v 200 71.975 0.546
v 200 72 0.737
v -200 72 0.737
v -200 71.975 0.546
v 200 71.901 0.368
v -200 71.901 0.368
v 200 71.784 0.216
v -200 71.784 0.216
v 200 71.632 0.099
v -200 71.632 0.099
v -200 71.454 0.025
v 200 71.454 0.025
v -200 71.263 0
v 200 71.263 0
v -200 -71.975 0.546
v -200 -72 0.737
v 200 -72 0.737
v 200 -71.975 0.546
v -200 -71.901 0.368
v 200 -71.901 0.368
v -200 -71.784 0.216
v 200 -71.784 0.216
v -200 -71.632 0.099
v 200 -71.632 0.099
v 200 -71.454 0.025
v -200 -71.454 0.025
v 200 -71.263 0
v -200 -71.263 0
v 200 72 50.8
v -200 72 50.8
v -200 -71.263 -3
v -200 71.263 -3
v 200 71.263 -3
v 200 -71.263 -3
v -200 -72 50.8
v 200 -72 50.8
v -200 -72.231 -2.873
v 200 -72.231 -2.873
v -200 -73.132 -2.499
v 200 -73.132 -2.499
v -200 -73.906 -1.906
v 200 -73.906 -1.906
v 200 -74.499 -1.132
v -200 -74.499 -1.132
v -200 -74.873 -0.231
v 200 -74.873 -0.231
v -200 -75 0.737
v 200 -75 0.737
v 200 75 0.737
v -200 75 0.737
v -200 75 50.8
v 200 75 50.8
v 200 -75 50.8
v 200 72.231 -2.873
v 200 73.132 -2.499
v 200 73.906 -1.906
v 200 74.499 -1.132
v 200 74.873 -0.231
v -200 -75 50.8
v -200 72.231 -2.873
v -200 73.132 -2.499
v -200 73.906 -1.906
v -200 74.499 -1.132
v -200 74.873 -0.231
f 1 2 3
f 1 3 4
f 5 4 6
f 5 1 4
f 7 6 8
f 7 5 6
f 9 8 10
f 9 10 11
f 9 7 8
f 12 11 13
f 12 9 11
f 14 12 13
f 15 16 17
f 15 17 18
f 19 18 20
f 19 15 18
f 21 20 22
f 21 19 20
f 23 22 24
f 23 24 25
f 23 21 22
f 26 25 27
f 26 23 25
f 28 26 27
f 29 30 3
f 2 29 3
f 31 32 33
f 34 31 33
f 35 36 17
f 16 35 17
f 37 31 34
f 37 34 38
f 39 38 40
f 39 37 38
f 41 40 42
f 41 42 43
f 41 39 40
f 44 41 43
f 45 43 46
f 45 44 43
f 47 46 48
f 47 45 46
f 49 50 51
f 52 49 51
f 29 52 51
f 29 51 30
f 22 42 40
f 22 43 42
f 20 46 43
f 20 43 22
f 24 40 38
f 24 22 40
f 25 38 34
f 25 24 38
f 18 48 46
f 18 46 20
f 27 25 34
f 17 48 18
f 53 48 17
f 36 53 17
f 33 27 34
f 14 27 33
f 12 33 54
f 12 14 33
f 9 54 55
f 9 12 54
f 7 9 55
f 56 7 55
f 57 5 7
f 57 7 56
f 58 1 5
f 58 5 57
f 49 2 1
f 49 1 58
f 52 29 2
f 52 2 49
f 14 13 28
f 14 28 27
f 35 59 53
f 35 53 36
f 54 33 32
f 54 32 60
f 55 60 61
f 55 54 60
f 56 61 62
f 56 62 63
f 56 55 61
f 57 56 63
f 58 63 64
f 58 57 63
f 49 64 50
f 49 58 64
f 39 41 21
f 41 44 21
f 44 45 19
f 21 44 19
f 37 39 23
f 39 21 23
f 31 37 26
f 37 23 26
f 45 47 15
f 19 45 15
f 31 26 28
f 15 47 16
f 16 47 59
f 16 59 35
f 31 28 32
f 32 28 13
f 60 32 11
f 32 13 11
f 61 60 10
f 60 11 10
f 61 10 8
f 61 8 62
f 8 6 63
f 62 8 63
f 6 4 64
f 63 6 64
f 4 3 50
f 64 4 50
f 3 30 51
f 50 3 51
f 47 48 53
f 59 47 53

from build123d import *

# Parameters (mm, degrees)
SKETCH1_W                    = 400
SKETCH1_H                    = 150
BASE_FLANGE1_DEPTH           = 3
EDGE_FLANGE1_STRIP_W         = 13.4732
EDGE_FLANGE1_STRIP_H         = 3
EDGE_FLANGE1_STRIP_CUT_DEPTH = 400
EDGE_FLANGE1_DEPTH           = 400
EDGE_FLANGE2_STRIP_W         = 13.4732
EDGE_FLANGE2_STRIP_H         = 3
EDGE_FLANGE2_STRIP_CUT_DEPTH = 400
EDGE_FLANGE2_DEPTH           = 400


# Sheet-metal steps are written as plain solids
with BuildPart() as part:
    # Sketch1 → Base-Flange1 (new body)
    with BuildSketch(Plane.XY):
        Rectangle(SKETCH1_W, SKETCH1_H)
    extrude(amount=-BASE_FLANGE1_DEPTH)

    # Edge-Flange1 strip (across the edge) → Edge-Flange1 strip cut (cut)
    with BuildSketch(Plane(origin=(-200, -75, 0), x_dir=(0, 1, 0), z_dir=(1, 0, 0))):
        with Locations((-3, -1.5)):
            Rectangle(EDGE_FLANGE1_STRIP_W, EDGE_FLANGE1_STRIP_H)
    extrude(amount=EDGE_FLANGE1_STRIP_CUT_DEPTH, mode=Mode.SUBTRACT)

    # Edge-Flange1 section (across the edge) → Edge-Flange1 (add)
    with BuildSketch(Plane(origin=(-200, -75, 0), x_dir=(0, 1, 0), z_dir=(1, 0, 0))):
        with BuildLine():
            Line((0, 0.7366), (0, 50.8))
            Line((0, 50.8), (3, 50.8))
            Line((3, 50.8), (3, 0.7366))
            ThreePointArc((3, 0.7366), (3.215745145, 0.215745145), (3.7366, 0))
            Line((3.7366, 0), (3.7366, -3))
            ThreePointArc((3.7366, -3), (1.094424801, -1.905575199), (0, 0.7366))
        make_face()
    extrude(amount=EDGE_FLANGE1_DEPTH)

    # Edge-Flange2 strip (across the edge) → Edge-Flange2 strip cut (cut)
    with BuildSketch(Plane(origin=(200, 75, 0), x_dir=(0, -1, 0), z_dir=(-1, 0, 0))):
        with Locations((-3, -1.5)):
            Rectangle(EDGE_FLANGE2_STRIP_W, EDGE_FLANGE2_STRIP_H)
    extrude(amount=EDGE_FLANGE2_STRIP_CUT_DEPTH, mode=Mode.SUBTRACT)

    # Edge-Flange2 section (across the edge) → Edge-Flange2 (add)
    with BuildSketch(Plane(origin=(200, 75, 0), x_dir=(0, -1, 0), z_dir=(-1, 0, 0))):
        with BuildLine():
            Line((0, 0.7366), (0, 50.8))
            Line((0, 50.8), (3, 50.8))
            Line((3, 50.8), (3, 0.7366))
            ThreePointArc((3, 0.7366), (3.215745145, 0.215745145), (3.7366, 0))
            Line((3.7366, 0), (3.7366, -3))
            ThreePointArc((3.7366, -3), (1.094424801, -1.905575199), (0, 0.7366))
        make_face()
    extrude(amount=EDGE_FLANGE2_DEPTH)


solid = part.part
